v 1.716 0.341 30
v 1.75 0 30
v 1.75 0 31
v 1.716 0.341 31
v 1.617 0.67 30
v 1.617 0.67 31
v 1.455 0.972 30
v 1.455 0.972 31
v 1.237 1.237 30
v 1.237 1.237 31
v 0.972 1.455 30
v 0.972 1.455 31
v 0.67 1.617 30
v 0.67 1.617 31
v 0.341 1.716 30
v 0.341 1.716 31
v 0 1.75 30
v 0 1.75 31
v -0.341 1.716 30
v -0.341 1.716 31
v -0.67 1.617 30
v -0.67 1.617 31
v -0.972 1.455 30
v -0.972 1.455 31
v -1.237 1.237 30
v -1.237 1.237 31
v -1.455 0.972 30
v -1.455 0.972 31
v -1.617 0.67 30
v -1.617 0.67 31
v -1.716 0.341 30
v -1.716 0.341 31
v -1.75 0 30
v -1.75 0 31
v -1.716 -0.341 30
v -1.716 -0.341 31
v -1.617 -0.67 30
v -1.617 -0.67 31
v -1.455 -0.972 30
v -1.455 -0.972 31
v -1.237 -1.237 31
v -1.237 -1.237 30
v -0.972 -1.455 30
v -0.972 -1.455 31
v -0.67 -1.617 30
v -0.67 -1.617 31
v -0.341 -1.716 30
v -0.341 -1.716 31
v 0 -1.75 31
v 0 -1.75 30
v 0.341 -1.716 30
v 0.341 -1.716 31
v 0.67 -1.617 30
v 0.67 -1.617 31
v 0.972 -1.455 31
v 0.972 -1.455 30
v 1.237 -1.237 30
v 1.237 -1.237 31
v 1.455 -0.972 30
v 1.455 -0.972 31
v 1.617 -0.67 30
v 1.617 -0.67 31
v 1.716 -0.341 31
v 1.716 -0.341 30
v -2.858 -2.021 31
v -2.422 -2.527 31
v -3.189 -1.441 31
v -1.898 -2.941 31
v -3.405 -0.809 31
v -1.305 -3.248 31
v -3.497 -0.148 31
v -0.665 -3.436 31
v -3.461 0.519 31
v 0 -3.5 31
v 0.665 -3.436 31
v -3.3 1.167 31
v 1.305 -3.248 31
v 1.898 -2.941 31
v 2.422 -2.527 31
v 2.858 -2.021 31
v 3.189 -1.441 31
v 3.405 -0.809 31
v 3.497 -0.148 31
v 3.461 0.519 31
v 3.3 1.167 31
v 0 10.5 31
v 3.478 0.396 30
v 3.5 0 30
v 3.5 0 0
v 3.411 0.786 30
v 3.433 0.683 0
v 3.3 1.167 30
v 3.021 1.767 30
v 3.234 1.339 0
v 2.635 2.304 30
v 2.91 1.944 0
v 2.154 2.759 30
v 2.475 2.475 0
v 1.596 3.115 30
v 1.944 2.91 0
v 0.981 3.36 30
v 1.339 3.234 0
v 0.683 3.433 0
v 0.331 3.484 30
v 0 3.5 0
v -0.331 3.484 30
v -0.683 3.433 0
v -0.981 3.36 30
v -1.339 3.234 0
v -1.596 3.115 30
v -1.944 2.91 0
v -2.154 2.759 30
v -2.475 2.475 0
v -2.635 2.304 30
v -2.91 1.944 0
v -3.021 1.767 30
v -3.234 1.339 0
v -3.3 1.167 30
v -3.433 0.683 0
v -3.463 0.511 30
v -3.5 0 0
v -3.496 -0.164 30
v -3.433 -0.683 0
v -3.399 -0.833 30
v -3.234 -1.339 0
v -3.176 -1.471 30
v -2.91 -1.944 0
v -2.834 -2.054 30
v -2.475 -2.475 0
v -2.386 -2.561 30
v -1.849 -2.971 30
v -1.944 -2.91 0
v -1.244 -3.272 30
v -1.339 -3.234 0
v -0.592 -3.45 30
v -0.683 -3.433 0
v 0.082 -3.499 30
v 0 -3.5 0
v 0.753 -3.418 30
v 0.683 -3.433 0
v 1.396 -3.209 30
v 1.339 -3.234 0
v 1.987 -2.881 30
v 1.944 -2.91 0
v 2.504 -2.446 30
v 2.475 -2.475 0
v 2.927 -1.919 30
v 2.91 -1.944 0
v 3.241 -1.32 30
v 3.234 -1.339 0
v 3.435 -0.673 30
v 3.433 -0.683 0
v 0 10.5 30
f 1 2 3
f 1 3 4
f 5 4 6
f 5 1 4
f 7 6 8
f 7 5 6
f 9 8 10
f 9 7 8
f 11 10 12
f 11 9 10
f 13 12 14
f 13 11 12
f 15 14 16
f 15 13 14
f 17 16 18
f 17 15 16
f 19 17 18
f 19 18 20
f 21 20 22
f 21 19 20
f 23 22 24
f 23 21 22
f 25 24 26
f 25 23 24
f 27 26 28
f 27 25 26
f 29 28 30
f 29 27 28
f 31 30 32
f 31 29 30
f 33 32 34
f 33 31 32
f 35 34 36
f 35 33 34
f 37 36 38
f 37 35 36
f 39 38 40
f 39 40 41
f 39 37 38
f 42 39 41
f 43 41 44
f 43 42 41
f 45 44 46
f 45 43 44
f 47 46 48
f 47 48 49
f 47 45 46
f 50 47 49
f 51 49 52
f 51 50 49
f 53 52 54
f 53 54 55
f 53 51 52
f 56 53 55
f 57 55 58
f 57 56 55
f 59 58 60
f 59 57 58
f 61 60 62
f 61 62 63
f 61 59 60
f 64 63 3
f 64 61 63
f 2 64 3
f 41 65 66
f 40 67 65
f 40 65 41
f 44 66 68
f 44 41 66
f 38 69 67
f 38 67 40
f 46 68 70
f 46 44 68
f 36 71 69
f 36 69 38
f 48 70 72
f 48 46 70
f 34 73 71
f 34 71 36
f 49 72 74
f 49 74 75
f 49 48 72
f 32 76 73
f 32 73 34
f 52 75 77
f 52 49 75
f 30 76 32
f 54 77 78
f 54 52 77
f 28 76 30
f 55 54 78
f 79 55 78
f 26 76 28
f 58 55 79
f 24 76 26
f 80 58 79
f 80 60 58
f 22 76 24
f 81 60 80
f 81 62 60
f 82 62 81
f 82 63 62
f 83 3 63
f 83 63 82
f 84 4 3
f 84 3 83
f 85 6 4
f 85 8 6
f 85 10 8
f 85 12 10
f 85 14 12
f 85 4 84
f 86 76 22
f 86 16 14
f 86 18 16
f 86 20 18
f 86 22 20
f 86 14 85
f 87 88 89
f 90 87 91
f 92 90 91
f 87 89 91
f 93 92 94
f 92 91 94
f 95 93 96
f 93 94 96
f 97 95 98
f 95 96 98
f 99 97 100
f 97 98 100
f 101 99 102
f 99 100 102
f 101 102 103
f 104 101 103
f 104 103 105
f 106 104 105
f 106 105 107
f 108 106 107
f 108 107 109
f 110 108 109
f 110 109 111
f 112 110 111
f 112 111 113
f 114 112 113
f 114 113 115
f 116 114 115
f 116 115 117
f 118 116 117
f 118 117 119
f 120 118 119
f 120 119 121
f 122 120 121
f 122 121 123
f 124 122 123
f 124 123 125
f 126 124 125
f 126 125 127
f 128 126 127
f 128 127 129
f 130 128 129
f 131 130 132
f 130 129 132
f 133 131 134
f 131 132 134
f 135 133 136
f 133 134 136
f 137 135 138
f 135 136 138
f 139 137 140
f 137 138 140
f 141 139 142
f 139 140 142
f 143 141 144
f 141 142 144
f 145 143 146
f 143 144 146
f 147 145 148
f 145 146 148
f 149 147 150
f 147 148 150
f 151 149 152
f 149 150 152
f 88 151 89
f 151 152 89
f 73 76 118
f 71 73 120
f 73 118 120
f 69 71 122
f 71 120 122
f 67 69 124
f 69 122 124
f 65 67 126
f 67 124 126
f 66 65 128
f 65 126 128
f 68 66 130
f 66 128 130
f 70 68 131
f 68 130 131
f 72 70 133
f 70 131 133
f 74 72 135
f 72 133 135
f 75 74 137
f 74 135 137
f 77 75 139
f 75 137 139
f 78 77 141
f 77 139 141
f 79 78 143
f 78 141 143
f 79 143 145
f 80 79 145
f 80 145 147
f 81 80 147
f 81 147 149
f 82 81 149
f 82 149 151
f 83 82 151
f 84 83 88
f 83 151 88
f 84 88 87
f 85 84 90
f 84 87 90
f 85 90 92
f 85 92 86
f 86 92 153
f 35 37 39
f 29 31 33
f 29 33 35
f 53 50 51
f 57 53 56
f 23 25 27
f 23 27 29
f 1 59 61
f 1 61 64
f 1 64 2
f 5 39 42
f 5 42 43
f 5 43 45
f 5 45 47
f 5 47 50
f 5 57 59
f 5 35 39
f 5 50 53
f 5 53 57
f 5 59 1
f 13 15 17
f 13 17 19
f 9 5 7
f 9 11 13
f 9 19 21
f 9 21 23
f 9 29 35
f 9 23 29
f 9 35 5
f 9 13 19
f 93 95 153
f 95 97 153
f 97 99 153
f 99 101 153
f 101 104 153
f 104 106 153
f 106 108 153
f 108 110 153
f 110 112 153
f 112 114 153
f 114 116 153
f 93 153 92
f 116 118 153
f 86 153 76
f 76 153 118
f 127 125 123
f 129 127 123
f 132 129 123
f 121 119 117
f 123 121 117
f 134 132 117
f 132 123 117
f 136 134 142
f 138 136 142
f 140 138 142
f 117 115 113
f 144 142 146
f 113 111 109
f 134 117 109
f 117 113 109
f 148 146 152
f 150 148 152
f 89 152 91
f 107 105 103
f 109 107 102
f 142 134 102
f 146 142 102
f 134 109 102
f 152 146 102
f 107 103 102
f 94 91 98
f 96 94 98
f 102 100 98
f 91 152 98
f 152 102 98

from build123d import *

# Parameters (mm, degrees)
SKETCH1_R           = 3.5
BOSS_EXTRUDE1_DEPTH = 30
SKETCH3_R           = 1.75
BOSS_EXTRUDE2_DEPTH = 1


with BuildPart() as part:
    # Sketch1 → Boss-Extrude1 (new body)
    with BuildSketch(Plane.XY):
        Circle(SKETCH1_R)
    extrude(amount=BOSS_EXTRUDE1_DEPTH)

    # Sketch3 → Boss-Extrude2 (add)
    with BuildSketch(Plane.XY.offset(30)):
        with BuildLine():
            Line((0, 10.5), (-3.299831646, 1.166666667))
            ThreePointArc((-3.299831646, 1.166666667), (0, -3.5), (3.299831646, 1.166666667))
            Line((3.299831646, 1.166666667), (0, 10.5))
        make_face()
        Circle(SKETCH3_R, mode=Mode.SUBTRACT)
    extrude(amount=BOSS_EXTRUDE2_DEPTH)


solid = part.part
